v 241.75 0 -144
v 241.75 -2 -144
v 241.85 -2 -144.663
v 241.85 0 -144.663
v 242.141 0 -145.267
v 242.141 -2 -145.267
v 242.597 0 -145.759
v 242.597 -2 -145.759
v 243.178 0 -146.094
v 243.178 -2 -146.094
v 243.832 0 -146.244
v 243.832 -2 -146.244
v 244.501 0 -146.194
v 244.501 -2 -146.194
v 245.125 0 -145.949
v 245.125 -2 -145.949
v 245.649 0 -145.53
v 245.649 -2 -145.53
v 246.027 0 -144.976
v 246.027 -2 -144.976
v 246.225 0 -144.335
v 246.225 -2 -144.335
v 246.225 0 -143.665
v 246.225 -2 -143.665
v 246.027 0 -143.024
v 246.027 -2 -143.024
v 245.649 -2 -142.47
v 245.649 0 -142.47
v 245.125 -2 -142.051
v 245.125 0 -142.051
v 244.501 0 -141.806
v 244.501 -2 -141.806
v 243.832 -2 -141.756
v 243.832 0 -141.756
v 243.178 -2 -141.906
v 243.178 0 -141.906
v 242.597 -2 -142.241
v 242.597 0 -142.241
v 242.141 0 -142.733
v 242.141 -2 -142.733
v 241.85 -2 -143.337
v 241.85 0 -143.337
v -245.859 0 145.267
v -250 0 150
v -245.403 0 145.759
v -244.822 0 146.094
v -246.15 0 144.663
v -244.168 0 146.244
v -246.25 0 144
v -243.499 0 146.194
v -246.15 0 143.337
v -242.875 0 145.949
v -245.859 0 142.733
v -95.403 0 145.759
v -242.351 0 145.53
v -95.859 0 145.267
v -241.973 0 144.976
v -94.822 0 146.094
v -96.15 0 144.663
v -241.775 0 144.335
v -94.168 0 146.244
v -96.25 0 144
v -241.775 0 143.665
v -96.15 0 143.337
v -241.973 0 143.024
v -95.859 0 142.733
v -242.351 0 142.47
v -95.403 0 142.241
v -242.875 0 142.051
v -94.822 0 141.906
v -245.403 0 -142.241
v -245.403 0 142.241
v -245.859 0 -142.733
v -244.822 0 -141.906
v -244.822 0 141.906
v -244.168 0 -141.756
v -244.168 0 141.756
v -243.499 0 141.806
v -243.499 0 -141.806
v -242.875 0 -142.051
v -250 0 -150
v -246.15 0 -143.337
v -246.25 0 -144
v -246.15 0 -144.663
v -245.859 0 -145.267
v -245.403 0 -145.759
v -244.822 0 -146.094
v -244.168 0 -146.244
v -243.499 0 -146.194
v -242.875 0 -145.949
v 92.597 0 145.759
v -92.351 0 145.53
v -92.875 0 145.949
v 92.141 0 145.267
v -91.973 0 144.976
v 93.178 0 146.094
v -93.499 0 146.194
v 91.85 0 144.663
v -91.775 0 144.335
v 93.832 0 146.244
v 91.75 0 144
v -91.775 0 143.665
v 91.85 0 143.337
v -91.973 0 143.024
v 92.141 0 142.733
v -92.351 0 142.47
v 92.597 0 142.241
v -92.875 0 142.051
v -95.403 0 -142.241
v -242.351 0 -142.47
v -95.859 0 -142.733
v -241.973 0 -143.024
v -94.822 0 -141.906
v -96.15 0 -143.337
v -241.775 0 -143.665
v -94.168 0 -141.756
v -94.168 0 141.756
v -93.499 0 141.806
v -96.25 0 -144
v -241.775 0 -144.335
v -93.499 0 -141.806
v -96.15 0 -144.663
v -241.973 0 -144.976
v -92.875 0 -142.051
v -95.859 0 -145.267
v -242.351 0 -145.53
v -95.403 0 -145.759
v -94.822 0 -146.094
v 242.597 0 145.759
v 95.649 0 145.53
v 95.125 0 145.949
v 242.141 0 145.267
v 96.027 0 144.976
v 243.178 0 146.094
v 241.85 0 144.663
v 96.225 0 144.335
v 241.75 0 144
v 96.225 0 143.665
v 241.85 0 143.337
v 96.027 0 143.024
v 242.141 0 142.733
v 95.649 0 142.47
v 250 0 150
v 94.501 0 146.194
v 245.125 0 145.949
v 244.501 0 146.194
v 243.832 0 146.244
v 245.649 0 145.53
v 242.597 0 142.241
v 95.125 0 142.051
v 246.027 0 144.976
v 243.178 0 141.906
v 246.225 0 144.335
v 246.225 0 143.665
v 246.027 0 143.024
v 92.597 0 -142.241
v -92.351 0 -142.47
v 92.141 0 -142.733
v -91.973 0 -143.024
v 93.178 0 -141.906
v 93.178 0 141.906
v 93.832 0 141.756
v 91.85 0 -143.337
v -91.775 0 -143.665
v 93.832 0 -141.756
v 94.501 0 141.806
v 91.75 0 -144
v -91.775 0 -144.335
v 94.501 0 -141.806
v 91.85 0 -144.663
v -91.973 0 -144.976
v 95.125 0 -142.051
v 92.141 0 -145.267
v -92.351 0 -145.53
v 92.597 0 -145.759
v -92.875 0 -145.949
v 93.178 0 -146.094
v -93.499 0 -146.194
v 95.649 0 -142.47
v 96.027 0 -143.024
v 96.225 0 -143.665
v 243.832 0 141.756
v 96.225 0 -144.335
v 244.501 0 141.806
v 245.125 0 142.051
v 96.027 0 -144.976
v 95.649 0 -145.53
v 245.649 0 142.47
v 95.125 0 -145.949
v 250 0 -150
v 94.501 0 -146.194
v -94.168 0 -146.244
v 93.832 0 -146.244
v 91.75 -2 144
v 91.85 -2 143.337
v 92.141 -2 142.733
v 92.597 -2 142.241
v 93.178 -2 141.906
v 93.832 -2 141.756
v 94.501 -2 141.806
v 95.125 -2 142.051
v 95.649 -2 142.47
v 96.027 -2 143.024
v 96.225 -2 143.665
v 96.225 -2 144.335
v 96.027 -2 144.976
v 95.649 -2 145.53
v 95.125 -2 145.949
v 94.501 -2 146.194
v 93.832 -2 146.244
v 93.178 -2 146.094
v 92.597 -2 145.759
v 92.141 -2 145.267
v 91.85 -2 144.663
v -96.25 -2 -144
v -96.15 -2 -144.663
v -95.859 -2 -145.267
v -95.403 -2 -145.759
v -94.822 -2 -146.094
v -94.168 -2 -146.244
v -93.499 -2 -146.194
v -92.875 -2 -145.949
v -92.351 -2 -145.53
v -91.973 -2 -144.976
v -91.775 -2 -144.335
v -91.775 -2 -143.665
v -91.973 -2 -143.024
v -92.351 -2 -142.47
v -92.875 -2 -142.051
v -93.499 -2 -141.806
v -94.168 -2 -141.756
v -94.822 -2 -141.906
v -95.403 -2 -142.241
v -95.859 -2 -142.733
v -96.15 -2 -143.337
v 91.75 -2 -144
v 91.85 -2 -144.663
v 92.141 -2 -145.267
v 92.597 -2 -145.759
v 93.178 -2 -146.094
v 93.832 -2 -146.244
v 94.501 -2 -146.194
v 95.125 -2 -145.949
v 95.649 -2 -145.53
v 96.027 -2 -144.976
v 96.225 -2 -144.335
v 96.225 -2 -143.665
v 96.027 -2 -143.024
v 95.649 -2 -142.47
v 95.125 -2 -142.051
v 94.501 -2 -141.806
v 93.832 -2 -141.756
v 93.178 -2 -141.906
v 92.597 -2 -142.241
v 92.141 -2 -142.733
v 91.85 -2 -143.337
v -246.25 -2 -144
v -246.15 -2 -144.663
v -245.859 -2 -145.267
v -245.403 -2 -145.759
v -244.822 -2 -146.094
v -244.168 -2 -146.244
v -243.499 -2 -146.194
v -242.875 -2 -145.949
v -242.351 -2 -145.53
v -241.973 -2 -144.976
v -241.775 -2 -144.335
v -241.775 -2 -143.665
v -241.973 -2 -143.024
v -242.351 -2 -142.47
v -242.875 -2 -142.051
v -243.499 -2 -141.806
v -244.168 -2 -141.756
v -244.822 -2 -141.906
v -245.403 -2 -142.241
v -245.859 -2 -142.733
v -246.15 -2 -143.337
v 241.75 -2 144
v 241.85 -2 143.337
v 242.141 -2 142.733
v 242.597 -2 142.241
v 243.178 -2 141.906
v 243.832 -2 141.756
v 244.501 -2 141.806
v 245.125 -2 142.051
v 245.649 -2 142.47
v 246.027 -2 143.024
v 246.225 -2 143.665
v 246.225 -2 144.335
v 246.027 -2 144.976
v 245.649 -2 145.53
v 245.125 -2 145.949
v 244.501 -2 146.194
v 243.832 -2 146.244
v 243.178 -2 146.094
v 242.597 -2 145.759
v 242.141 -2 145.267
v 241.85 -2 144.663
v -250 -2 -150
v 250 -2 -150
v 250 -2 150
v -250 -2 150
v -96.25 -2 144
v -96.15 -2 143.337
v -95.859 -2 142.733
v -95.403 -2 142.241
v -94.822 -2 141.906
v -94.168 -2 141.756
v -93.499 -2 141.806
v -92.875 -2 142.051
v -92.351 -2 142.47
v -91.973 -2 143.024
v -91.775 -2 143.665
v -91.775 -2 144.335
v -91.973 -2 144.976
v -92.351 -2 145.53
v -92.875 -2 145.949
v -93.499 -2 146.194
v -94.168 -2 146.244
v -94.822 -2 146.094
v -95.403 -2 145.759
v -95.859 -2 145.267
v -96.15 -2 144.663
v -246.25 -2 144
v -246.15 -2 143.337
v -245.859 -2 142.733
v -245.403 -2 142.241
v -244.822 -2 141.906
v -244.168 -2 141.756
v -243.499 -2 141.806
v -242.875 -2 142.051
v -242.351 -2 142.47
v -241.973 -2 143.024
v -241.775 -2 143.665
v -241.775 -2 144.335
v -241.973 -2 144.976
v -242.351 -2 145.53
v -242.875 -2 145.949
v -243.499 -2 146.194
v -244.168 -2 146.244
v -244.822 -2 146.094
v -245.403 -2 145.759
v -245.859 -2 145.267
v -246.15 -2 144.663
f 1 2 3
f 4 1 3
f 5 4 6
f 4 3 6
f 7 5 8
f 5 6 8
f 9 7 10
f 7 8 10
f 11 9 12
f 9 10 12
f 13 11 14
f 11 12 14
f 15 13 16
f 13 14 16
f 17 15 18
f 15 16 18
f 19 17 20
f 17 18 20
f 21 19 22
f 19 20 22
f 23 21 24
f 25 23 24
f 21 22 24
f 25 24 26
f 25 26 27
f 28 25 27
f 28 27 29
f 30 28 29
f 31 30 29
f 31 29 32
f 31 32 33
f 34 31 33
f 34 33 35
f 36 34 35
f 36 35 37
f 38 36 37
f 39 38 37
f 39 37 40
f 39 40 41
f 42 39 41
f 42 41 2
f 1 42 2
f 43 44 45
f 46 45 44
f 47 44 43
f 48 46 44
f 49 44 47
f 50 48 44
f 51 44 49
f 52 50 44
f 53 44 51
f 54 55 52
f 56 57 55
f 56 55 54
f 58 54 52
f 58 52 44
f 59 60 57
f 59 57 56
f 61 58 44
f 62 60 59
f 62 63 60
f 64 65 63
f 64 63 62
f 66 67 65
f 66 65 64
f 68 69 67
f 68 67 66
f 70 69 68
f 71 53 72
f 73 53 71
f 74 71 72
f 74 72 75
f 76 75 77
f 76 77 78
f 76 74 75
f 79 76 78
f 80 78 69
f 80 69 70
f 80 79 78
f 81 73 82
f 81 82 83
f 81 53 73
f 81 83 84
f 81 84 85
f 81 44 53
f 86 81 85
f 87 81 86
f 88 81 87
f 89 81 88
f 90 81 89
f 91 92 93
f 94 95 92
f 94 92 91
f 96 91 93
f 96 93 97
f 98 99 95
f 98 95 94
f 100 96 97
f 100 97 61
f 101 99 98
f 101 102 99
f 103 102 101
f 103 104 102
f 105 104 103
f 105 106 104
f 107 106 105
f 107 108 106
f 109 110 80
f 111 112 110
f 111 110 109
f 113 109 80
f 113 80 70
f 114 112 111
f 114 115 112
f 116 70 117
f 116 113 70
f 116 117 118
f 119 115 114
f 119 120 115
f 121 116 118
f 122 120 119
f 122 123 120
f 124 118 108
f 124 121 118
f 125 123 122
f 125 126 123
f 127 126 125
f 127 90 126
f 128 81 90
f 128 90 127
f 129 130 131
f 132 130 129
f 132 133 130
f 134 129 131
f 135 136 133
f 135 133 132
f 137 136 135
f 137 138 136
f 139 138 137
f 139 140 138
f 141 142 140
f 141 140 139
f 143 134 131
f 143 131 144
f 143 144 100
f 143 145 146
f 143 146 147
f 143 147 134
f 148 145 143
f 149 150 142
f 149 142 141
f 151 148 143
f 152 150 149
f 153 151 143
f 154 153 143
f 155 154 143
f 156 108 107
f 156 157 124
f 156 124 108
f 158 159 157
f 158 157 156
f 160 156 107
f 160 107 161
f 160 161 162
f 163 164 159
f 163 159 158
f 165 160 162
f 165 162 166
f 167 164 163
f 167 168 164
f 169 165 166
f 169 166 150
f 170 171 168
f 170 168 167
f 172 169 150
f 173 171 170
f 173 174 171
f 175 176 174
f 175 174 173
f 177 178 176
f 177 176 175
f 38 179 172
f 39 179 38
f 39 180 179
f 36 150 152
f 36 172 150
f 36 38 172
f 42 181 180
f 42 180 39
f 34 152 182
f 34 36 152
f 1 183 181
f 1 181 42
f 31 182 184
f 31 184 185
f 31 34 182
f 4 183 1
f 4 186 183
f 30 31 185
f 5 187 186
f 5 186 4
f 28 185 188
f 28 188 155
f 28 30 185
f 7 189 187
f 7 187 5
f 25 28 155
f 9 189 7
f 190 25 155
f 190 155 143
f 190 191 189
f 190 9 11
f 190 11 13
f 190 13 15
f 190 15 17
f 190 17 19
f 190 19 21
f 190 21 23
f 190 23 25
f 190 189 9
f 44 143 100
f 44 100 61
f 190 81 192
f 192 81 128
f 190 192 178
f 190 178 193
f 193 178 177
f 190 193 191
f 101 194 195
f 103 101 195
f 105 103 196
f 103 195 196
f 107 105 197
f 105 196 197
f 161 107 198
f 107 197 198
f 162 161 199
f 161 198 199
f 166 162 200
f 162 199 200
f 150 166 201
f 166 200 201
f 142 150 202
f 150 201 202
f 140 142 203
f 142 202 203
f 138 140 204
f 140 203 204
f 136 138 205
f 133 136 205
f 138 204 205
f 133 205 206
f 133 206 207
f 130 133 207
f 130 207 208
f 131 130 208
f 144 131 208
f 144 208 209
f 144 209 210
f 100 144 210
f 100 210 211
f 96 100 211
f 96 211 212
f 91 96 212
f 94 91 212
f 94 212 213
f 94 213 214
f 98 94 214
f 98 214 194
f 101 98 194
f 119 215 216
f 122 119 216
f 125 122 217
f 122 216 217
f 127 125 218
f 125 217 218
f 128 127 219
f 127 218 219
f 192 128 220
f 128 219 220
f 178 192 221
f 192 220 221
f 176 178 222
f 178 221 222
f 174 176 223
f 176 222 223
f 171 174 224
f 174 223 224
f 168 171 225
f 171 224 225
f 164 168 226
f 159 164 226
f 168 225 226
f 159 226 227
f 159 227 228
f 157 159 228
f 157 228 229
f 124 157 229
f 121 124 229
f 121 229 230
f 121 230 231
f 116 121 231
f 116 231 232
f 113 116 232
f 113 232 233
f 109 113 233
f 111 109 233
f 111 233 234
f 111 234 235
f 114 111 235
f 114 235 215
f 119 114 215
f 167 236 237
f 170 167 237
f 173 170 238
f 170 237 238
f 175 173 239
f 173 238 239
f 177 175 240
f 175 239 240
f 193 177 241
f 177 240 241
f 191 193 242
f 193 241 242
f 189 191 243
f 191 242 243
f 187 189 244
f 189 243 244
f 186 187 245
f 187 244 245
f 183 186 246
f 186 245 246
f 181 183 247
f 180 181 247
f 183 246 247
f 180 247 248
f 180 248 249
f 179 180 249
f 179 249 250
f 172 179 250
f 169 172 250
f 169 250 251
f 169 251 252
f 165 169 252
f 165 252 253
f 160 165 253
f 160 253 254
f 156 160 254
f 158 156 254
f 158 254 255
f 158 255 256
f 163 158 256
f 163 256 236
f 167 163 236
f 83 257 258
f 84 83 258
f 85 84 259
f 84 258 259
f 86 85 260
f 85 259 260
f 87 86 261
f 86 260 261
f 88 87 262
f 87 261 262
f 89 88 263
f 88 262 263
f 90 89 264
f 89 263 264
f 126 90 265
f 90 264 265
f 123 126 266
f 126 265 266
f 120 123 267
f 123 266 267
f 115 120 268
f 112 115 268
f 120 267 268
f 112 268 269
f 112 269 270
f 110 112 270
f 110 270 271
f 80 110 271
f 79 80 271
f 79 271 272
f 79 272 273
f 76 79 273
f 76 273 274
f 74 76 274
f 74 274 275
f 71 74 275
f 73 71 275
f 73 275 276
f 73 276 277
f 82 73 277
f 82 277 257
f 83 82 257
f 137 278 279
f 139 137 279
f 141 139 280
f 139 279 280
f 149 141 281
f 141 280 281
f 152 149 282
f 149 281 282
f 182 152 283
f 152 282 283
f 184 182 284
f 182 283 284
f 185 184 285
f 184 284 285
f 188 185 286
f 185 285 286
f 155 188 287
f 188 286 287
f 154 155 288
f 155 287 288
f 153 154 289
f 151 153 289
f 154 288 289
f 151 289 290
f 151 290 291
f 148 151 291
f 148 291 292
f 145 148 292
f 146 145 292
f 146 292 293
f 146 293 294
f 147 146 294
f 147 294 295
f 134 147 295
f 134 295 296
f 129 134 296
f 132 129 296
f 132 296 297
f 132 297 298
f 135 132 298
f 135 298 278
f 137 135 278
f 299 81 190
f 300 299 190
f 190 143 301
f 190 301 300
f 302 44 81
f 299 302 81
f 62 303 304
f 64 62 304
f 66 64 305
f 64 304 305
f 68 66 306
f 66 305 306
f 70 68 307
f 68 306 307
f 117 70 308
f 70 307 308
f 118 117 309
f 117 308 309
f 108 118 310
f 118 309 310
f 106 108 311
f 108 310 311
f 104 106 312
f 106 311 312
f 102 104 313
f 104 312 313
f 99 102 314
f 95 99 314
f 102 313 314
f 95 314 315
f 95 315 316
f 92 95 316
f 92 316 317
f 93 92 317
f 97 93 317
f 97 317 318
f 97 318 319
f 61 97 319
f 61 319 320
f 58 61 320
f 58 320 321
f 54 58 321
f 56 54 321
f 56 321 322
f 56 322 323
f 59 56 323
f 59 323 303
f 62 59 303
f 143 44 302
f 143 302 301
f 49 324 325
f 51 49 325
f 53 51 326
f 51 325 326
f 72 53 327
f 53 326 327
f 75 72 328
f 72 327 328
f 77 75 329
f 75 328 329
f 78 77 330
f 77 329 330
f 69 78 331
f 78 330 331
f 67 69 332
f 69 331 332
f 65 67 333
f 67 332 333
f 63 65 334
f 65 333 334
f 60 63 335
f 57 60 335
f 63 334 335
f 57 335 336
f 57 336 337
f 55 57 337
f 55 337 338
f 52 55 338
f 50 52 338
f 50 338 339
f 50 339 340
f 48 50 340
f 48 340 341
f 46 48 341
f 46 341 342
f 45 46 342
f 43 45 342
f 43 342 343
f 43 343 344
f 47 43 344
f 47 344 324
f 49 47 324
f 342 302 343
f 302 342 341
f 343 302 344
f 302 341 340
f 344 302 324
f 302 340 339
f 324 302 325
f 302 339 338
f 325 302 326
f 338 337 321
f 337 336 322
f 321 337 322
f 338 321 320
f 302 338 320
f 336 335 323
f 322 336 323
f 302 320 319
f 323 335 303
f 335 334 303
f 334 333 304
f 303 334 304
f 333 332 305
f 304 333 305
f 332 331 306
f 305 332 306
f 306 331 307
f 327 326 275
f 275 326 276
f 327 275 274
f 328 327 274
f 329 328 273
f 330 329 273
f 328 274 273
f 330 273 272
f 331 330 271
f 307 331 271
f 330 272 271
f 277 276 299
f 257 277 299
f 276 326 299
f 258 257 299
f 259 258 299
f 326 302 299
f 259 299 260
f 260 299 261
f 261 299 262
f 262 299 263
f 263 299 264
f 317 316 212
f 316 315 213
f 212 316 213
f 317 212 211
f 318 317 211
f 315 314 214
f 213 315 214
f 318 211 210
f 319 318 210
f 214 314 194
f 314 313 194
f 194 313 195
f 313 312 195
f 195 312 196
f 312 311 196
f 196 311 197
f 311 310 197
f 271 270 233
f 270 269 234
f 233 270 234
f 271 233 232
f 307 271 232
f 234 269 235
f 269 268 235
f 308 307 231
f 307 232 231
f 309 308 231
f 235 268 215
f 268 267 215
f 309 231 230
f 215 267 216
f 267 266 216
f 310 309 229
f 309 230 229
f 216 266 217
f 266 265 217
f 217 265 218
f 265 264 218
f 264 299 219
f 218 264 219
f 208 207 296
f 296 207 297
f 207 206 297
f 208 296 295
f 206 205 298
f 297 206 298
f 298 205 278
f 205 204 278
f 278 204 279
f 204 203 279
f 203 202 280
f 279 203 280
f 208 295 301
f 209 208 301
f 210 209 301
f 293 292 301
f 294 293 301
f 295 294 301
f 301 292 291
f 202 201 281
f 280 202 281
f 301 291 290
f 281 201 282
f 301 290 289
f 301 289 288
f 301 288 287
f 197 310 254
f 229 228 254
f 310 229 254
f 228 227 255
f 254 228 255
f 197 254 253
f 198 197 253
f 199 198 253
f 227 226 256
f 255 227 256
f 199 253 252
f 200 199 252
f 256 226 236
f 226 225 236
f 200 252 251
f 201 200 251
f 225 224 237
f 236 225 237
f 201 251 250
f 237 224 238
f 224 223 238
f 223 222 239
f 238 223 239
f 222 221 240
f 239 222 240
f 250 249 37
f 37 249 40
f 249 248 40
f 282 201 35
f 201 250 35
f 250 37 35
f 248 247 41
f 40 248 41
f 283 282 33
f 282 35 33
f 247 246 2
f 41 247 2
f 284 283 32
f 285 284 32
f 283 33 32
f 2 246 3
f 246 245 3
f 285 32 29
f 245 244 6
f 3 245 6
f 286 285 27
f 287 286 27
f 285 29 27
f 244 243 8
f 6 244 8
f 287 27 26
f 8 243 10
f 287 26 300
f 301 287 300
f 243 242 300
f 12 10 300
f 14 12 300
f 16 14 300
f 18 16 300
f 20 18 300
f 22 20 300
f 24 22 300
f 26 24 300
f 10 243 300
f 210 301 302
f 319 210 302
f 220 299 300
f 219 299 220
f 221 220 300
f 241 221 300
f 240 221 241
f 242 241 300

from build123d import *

# Parameters (mm, degrees)
SKETCH1_W            = 500
SKETCH1_H            = 300
BASE_FLANGE1_DEPTH   = 2
M4_CLEARANCE_HOLE1_D = 4.5


# Sheet-metal steps are written as plain solids
with BuildPart() as part:
    # Sketch1 → Base-Flange1 (new body)
    with BuildSketch(Plane(origin=(0, 0, 0), x_dir=(1, 0, 0), z_dir=(0, 1, 0))):
        Rectangle(SKETCH1_W, SKETCH1_H)
    extrude(amount=-BASE_FLANGE1_DEPTH)

    # M4 Clearance Hole1 (through all)
    with Locations(Plane(origin=(0, 0, 0), x_dir=(1, 0, 0), z_dir=(0, 1, 0))):
        with Locations((244, 144), (94, 144), (-94, 144), (-244, 144), (-244, -144), (-94, -144), (94, -144), (244, -144)):
            Hole(M4_CLEARANCE_HOLE1_D / 2)


solid = part.part
